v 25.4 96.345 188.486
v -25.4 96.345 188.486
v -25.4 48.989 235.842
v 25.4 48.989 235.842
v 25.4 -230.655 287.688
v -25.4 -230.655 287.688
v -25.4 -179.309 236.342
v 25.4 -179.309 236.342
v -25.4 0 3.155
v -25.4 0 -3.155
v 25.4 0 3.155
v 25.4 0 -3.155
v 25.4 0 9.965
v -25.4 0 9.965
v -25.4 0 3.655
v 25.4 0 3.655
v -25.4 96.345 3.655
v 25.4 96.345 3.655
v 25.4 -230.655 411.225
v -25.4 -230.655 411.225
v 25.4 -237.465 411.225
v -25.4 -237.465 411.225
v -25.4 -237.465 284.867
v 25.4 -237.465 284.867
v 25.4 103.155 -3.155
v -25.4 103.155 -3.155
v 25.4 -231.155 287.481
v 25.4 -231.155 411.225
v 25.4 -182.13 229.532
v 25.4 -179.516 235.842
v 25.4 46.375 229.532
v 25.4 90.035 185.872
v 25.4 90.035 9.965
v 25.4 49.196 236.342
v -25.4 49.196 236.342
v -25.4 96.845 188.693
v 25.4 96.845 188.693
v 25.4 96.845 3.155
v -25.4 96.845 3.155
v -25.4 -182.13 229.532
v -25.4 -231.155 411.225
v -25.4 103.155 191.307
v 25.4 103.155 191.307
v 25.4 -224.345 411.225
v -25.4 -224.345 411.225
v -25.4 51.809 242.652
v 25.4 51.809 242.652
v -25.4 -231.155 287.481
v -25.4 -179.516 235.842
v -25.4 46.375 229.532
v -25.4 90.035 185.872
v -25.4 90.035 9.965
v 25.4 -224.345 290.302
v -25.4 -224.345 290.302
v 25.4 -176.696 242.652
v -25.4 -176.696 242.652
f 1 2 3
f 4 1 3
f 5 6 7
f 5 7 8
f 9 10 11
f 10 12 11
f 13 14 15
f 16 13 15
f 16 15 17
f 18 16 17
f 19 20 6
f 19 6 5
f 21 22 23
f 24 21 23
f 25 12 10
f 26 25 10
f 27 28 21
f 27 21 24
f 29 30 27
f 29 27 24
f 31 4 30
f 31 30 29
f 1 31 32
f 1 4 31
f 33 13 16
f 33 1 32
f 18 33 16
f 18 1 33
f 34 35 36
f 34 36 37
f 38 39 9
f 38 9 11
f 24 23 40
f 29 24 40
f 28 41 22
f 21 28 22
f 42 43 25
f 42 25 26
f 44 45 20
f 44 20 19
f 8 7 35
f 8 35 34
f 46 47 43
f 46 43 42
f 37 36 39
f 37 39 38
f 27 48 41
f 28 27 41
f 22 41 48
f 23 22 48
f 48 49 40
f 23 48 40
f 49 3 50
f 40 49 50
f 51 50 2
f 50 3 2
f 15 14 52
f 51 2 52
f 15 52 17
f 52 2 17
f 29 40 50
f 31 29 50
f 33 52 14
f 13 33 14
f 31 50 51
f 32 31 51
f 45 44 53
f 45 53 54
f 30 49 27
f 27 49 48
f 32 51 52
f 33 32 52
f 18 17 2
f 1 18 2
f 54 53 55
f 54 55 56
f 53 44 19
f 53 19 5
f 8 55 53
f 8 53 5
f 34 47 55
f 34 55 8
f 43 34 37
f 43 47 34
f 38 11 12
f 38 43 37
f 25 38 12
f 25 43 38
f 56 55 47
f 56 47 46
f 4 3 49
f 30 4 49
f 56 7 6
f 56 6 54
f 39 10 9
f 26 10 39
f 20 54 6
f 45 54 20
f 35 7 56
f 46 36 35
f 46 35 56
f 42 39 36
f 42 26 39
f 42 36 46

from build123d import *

# Parameters (mm, degrees)
CROQUIS1_W              = 50.8
CROQUIS1_H              = 6.31
SALIENTE_EXTRUIR1_DEPTH = 50.8


with BuildPart() as part:
    # Barrer1: sweep along a curve in space
    with BuildLine() as barrer1_path:
        Line((0, 0, 0), (0, 100, 0))
        Line((0, 100, 0), (0, 100, 190))
        Line((0, 100, 190), (0, 50.502525317, 239.497474683))
        Line((0, 50.502525317, 239.497474683), (0, -178.002525317, 239.497474683))
        Line((0, -178.002525317, 239.497474683), (0, -227.5, 288.994949366))
        Line((0, -227.5, 288.994949366), (0, -227.5, 411.224949366))
    # Croquis1 → Barrer1 (sweep)
    with BuildSketch(Plane(origin=(0, 0, 0), x_dir=(1, 0, 0), z_dir=(0, 1, 0))):
        Rectangle(CROQUIS1_W, CROQUIS1_H)
    sweep(path=barrer1_path.line, transition=Transition.RIGHT)


with BuildPart() as body_2:
    # Croquis2 → Saliente-Extruir1 (new body)
    with BuildSketch(Plane.ZY.offset(25.4)):
        Polygon((3.655, 0), (3.655, 96.345), (188.48604943, 96.345), (235.842474683, 48.988574746), (235.842474683, -179.516475887), (287.480998796, -231.155), (411.224949366, -231.155), (411.224949366, -237.465), (284.867311217, -237.465), (229.532474683, -182.130163466), (229.532474683, 46.374887168), (185.872361851, 90.035), (9.965, 90.035), (9.965, 0), align=None)
    extrude(amount=-SALIENTE_EXTRUIR1_DEPTH)


solid = Compound([part.part, body_2.part])
